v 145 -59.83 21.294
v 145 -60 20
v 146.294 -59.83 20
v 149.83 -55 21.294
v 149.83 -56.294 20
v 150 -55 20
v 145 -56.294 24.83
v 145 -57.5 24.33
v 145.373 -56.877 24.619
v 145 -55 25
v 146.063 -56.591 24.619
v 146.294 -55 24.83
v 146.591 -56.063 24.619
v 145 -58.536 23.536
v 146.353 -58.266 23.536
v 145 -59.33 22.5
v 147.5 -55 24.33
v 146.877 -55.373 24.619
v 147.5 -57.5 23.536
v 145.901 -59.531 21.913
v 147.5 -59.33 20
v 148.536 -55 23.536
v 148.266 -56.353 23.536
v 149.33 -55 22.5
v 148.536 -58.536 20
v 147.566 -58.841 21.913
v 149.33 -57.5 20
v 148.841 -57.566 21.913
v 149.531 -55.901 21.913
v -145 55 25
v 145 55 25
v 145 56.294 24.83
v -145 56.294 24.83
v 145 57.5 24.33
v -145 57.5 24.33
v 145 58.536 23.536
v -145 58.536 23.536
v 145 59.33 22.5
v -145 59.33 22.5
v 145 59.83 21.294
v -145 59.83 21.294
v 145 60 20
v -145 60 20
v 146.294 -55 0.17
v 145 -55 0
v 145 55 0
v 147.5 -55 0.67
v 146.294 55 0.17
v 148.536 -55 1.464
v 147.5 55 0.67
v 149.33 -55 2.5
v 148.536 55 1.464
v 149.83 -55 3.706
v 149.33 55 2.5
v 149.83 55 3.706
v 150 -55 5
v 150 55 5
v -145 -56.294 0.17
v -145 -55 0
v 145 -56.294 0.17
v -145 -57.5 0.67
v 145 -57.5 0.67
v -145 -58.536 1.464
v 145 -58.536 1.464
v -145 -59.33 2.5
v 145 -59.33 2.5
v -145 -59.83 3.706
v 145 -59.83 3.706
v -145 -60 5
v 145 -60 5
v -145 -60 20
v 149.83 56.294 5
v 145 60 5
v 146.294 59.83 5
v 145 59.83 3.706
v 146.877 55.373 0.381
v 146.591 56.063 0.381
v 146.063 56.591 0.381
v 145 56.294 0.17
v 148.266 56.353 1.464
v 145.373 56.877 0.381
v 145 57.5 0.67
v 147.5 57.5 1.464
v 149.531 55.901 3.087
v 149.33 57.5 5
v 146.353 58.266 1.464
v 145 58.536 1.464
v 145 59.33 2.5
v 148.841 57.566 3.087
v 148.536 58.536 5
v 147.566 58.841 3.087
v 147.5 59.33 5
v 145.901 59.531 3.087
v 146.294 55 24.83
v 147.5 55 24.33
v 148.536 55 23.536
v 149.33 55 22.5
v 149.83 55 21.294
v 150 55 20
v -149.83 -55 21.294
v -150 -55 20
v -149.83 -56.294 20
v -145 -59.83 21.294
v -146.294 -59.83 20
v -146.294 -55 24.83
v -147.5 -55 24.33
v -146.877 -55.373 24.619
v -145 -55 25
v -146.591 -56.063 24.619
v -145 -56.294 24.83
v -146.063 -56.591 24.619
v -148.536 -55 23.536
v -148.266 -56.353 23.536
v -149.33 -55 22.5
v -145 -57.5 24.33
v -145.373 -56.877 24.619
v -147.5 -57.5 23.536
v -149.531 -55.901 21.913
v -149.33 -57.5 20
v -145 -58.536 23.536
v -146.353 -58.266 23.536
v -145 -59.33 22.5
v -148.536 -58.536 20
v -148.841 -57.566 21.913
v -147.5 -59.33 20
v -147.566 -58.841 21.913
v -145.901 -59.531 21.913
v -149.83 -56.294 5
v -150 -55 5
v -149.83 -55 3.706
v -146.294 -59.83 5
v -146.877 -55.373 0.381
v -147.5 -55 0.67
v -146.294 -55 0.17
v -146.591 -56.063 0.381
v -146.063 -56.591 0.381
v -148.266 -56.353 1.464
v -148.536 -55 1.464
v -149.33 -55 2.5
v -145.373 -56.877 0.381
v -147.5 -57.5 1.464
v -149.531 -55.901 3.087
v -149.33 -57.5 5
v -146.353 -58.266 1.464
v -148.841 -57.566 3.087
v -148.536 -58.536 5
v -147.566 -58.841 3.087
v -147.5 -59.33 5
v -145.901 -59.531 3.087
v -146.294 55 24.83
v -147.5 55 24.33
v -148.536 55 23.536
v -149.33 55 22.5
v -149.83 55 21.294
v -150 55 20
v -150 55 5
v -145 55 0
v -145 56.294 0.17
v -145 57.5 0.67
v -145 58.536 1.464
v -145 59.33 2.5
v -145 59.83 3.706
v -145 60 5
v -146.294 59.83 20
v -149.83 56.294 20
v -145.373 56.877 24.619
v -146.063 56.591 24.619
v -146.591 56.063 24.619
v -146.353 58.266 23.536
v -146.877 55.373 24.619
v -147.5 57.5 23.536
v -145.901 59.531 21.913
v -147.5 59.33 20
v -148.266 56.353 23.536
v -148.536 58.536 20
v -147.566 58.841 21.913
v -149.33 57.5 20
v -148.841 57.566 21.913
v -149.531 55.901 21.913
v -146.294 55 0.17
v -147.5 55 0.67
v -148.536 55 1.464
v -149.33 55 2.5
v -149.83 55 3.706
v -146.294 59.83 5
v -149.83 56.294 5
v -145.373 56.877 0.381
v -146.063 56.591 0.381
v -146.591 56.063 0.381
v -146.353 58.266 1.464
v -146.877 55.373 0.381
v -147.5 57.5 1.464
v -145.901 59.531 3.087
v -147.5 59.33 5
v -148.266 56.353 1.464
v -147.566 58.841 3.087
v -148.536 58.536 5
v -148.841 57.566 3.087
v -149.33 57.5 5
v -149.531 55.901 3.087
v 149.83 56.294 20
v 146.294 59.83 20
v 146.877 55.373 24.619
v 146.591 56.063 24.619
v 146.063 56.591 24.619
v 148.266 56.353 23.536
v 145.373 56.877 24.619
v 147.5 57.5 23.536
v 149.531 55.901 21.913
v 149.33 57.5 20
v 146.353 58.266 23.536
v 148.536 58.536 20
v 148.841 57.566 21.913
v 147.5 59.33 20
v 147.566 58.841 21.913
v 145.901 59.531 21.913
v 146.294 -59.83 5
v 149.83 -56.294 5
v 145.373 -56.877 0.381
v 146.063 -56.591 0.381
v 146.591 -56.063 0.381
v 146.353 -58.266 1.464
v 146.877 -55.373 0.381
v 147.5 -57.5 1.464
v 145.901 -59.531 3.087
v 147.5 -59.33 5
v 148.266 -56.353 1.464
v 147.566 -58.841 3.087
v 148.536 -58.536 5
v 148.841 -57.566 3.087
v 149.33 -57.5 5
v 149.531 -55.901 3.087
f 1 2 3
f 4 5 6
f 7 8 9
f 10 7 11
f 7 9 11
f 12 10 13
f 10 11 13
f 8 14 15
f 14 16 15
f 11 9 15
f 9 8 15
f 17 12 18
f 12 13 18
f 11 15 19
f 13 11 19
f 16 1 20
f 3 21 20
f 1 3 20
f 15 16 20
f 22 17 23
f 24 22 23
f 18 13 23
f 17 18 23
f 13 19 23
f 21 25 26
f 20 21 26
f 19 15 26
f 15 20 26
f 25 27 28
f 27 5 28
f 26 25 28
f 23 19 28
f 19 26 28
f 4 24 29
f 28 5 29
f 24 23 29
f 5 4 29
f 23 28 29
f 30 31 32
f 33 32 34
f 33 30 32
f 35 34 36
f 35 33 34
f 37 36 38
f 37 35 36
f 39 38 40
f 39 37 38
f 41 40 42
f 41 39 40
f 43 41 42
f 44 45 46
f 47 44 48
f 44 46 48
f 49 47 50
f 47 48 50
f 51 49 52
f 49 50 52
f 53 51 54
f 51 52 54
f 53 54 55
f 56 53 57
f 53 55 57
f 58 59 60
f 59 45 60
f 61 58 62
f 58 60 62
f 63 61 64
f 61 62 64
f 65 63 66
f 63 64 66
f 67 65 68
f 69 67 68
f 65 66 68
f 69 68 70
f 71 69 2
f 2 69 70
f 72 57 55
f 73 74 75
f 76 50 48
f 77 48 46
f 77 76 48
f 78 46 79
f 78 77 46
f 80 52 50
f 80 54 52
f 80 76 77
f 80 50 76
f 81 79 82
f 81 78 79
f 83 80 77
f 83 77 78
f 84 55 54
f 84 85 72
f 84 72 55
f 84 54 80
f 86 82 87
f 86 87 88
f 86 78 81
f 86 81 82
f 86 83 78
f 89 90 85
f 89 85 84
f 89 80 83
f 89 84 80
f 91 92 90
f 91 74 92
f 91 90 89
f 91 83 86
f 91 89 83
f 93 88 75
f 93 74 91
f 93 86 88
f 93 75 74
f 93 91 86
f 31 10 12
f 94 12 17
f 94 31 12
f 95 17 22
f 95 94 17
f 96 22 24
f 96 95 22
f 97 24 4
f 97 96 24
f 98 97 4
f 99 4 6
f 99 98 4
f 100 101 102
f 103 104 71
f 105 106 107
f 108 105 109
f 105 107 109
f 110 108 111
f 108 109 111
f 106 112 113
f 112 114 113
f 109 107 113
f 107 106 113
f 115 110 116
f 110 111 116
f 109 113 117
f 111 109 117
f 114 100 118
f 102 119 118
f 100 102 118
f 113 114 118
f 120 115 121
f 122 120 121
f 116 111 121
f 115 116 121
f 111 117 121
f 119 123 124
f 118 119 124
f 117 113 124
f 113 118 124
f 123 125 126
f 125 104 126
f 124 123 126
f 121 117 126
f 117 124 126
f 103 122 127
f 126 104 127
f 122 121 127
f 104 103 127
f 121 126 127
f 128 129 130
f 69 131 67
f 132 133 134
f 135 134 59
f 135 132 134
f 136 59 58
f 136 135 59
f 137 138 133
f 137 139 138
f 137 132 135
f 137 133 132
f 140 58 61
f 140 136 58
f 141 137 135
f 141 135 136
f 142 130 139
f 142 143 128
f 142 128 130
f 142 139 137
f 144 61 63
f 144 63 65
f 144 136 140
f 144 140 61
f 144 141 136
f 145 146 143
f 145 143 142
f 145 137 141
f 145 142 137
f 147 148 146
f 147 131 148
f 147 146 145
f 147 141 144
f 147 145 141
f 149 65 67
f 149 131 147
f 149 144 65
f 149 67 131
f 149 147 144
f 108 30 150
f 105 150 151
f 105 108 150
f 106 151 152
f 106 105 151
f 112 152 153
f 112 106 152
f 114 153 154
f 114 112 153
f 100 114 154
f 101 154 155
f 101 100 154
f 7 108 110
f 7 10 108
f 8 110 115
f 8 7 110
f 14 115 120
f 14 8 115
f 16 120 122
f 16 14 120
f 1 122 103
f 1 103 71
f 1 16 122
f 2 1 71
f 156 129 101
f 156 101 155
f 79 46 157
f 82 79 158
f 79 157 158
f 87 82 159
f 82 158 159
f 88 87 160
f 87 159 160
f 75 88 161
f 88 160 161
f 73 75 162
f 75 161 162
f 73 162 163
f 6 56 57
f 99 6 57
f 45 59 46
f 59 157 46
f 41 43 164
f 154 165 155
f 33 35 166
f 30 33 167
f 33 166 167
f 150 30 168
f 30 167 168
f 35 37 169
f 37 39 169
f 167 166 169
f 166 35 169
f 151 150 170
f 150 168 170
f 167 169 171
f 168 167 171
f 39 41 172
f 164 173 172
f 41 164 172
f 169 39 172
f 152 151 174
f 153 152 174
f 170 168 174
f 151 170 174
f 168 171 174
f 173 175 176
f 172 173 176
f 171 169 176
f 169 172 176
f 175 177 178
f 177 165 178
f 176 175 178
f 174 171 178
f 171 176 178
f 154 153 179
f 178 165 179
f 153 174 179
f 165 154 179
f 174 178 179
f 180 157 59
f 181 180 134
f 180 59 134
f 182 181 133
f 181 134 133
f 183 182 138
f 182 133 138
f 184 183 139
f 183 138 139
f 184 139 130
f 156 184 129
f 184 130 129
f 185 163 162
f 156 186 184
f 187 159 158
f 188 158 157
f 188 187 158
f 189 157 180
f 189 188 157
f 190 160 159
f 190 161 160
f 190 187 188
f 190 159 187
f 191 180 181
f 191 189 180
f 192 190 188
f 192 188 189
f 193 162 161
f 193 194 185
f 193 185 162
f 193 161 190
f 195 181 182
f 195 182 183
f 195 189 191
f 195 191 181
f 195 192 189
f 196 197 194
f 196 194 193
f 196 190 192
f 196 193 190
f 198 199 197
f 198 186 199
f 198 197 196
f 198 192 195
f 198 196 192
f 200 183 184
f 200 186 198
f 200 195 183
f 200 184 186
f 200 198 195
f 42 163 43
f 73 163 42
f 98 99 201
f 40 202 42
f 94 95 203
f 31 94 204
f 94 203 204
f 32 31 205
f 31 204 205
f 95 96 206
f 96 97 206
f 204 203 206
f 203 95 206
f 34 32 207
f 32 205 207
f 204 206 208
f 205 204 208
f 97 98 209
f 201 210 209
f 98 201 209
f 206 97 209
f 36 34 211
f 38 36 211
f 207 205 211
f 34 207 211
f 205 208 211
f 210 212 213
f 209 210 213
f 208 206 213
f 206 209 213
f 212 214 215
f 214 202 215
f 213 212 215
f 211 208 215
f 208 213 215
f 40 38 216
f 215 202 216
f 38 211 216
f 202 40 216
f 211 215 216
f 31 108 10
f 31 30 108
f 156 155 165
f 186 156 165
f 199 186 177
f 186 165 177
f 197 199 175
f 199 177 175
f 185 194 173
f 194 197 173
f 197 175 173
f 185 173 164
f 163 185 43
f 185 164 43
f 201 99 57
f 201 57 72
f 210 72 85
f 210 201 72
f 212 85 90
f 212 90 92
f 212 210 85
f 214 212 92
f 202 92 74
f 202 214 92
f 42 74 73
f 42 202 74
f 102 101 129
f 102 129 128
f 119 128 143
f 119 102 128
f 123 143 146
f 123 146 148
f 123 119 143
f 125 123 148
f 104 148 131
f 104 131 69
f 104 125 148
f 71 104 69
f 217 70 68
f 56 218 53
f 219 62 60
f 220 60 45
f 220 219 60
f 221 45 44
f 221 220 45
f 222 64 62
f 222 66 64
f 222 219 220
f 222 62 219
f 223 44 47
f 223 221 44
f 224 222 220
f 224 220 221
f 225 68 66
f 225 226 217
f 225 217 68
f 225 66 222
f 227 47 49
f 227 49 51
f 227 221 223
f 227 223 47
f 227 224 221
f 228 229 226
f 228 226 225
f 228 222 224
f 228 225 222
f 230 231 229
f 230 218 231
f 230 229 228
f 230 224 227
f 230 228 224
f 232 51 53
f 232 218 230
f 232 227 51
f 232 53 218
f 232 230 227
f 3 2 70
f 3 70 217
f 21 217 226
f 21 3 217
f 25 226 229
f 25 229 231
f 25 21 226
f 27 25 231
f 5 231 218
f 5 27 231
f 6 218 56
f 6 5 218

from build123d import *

# Parameters (mm, degrees)
F0_W     = 300
F0_H     = 120
F1_DEPTH = 25
F2_R     = 5
F3_R     = 5


with BuildPart() as f1:
    # F0 (on Top) → F1 (new body)
    with BuildSketch(Plane.XY):
        Rectangle(F0_W, F0_H)
    extrude(amount=F1_DEPTH)

    # F2
    f2_edges = [f1.edges().sort_by_distance(p)[0] for p in [
        (150, -60, 12.5),
        (150, 60, 12.5),
        (-150, -60, 12.5),
        (-150, 60, 12.5),
    ]]
    fillet(f2_edges, radius=F2_R)

    # F3
    f3_edges = [f1.edges().sort_by_distance(p)[0] for p in [
        (0, -60, 0),
        (0, -60, 25),
    ]]
    fillet(f3_edges, radius=F3_R)


solid = f1.part
